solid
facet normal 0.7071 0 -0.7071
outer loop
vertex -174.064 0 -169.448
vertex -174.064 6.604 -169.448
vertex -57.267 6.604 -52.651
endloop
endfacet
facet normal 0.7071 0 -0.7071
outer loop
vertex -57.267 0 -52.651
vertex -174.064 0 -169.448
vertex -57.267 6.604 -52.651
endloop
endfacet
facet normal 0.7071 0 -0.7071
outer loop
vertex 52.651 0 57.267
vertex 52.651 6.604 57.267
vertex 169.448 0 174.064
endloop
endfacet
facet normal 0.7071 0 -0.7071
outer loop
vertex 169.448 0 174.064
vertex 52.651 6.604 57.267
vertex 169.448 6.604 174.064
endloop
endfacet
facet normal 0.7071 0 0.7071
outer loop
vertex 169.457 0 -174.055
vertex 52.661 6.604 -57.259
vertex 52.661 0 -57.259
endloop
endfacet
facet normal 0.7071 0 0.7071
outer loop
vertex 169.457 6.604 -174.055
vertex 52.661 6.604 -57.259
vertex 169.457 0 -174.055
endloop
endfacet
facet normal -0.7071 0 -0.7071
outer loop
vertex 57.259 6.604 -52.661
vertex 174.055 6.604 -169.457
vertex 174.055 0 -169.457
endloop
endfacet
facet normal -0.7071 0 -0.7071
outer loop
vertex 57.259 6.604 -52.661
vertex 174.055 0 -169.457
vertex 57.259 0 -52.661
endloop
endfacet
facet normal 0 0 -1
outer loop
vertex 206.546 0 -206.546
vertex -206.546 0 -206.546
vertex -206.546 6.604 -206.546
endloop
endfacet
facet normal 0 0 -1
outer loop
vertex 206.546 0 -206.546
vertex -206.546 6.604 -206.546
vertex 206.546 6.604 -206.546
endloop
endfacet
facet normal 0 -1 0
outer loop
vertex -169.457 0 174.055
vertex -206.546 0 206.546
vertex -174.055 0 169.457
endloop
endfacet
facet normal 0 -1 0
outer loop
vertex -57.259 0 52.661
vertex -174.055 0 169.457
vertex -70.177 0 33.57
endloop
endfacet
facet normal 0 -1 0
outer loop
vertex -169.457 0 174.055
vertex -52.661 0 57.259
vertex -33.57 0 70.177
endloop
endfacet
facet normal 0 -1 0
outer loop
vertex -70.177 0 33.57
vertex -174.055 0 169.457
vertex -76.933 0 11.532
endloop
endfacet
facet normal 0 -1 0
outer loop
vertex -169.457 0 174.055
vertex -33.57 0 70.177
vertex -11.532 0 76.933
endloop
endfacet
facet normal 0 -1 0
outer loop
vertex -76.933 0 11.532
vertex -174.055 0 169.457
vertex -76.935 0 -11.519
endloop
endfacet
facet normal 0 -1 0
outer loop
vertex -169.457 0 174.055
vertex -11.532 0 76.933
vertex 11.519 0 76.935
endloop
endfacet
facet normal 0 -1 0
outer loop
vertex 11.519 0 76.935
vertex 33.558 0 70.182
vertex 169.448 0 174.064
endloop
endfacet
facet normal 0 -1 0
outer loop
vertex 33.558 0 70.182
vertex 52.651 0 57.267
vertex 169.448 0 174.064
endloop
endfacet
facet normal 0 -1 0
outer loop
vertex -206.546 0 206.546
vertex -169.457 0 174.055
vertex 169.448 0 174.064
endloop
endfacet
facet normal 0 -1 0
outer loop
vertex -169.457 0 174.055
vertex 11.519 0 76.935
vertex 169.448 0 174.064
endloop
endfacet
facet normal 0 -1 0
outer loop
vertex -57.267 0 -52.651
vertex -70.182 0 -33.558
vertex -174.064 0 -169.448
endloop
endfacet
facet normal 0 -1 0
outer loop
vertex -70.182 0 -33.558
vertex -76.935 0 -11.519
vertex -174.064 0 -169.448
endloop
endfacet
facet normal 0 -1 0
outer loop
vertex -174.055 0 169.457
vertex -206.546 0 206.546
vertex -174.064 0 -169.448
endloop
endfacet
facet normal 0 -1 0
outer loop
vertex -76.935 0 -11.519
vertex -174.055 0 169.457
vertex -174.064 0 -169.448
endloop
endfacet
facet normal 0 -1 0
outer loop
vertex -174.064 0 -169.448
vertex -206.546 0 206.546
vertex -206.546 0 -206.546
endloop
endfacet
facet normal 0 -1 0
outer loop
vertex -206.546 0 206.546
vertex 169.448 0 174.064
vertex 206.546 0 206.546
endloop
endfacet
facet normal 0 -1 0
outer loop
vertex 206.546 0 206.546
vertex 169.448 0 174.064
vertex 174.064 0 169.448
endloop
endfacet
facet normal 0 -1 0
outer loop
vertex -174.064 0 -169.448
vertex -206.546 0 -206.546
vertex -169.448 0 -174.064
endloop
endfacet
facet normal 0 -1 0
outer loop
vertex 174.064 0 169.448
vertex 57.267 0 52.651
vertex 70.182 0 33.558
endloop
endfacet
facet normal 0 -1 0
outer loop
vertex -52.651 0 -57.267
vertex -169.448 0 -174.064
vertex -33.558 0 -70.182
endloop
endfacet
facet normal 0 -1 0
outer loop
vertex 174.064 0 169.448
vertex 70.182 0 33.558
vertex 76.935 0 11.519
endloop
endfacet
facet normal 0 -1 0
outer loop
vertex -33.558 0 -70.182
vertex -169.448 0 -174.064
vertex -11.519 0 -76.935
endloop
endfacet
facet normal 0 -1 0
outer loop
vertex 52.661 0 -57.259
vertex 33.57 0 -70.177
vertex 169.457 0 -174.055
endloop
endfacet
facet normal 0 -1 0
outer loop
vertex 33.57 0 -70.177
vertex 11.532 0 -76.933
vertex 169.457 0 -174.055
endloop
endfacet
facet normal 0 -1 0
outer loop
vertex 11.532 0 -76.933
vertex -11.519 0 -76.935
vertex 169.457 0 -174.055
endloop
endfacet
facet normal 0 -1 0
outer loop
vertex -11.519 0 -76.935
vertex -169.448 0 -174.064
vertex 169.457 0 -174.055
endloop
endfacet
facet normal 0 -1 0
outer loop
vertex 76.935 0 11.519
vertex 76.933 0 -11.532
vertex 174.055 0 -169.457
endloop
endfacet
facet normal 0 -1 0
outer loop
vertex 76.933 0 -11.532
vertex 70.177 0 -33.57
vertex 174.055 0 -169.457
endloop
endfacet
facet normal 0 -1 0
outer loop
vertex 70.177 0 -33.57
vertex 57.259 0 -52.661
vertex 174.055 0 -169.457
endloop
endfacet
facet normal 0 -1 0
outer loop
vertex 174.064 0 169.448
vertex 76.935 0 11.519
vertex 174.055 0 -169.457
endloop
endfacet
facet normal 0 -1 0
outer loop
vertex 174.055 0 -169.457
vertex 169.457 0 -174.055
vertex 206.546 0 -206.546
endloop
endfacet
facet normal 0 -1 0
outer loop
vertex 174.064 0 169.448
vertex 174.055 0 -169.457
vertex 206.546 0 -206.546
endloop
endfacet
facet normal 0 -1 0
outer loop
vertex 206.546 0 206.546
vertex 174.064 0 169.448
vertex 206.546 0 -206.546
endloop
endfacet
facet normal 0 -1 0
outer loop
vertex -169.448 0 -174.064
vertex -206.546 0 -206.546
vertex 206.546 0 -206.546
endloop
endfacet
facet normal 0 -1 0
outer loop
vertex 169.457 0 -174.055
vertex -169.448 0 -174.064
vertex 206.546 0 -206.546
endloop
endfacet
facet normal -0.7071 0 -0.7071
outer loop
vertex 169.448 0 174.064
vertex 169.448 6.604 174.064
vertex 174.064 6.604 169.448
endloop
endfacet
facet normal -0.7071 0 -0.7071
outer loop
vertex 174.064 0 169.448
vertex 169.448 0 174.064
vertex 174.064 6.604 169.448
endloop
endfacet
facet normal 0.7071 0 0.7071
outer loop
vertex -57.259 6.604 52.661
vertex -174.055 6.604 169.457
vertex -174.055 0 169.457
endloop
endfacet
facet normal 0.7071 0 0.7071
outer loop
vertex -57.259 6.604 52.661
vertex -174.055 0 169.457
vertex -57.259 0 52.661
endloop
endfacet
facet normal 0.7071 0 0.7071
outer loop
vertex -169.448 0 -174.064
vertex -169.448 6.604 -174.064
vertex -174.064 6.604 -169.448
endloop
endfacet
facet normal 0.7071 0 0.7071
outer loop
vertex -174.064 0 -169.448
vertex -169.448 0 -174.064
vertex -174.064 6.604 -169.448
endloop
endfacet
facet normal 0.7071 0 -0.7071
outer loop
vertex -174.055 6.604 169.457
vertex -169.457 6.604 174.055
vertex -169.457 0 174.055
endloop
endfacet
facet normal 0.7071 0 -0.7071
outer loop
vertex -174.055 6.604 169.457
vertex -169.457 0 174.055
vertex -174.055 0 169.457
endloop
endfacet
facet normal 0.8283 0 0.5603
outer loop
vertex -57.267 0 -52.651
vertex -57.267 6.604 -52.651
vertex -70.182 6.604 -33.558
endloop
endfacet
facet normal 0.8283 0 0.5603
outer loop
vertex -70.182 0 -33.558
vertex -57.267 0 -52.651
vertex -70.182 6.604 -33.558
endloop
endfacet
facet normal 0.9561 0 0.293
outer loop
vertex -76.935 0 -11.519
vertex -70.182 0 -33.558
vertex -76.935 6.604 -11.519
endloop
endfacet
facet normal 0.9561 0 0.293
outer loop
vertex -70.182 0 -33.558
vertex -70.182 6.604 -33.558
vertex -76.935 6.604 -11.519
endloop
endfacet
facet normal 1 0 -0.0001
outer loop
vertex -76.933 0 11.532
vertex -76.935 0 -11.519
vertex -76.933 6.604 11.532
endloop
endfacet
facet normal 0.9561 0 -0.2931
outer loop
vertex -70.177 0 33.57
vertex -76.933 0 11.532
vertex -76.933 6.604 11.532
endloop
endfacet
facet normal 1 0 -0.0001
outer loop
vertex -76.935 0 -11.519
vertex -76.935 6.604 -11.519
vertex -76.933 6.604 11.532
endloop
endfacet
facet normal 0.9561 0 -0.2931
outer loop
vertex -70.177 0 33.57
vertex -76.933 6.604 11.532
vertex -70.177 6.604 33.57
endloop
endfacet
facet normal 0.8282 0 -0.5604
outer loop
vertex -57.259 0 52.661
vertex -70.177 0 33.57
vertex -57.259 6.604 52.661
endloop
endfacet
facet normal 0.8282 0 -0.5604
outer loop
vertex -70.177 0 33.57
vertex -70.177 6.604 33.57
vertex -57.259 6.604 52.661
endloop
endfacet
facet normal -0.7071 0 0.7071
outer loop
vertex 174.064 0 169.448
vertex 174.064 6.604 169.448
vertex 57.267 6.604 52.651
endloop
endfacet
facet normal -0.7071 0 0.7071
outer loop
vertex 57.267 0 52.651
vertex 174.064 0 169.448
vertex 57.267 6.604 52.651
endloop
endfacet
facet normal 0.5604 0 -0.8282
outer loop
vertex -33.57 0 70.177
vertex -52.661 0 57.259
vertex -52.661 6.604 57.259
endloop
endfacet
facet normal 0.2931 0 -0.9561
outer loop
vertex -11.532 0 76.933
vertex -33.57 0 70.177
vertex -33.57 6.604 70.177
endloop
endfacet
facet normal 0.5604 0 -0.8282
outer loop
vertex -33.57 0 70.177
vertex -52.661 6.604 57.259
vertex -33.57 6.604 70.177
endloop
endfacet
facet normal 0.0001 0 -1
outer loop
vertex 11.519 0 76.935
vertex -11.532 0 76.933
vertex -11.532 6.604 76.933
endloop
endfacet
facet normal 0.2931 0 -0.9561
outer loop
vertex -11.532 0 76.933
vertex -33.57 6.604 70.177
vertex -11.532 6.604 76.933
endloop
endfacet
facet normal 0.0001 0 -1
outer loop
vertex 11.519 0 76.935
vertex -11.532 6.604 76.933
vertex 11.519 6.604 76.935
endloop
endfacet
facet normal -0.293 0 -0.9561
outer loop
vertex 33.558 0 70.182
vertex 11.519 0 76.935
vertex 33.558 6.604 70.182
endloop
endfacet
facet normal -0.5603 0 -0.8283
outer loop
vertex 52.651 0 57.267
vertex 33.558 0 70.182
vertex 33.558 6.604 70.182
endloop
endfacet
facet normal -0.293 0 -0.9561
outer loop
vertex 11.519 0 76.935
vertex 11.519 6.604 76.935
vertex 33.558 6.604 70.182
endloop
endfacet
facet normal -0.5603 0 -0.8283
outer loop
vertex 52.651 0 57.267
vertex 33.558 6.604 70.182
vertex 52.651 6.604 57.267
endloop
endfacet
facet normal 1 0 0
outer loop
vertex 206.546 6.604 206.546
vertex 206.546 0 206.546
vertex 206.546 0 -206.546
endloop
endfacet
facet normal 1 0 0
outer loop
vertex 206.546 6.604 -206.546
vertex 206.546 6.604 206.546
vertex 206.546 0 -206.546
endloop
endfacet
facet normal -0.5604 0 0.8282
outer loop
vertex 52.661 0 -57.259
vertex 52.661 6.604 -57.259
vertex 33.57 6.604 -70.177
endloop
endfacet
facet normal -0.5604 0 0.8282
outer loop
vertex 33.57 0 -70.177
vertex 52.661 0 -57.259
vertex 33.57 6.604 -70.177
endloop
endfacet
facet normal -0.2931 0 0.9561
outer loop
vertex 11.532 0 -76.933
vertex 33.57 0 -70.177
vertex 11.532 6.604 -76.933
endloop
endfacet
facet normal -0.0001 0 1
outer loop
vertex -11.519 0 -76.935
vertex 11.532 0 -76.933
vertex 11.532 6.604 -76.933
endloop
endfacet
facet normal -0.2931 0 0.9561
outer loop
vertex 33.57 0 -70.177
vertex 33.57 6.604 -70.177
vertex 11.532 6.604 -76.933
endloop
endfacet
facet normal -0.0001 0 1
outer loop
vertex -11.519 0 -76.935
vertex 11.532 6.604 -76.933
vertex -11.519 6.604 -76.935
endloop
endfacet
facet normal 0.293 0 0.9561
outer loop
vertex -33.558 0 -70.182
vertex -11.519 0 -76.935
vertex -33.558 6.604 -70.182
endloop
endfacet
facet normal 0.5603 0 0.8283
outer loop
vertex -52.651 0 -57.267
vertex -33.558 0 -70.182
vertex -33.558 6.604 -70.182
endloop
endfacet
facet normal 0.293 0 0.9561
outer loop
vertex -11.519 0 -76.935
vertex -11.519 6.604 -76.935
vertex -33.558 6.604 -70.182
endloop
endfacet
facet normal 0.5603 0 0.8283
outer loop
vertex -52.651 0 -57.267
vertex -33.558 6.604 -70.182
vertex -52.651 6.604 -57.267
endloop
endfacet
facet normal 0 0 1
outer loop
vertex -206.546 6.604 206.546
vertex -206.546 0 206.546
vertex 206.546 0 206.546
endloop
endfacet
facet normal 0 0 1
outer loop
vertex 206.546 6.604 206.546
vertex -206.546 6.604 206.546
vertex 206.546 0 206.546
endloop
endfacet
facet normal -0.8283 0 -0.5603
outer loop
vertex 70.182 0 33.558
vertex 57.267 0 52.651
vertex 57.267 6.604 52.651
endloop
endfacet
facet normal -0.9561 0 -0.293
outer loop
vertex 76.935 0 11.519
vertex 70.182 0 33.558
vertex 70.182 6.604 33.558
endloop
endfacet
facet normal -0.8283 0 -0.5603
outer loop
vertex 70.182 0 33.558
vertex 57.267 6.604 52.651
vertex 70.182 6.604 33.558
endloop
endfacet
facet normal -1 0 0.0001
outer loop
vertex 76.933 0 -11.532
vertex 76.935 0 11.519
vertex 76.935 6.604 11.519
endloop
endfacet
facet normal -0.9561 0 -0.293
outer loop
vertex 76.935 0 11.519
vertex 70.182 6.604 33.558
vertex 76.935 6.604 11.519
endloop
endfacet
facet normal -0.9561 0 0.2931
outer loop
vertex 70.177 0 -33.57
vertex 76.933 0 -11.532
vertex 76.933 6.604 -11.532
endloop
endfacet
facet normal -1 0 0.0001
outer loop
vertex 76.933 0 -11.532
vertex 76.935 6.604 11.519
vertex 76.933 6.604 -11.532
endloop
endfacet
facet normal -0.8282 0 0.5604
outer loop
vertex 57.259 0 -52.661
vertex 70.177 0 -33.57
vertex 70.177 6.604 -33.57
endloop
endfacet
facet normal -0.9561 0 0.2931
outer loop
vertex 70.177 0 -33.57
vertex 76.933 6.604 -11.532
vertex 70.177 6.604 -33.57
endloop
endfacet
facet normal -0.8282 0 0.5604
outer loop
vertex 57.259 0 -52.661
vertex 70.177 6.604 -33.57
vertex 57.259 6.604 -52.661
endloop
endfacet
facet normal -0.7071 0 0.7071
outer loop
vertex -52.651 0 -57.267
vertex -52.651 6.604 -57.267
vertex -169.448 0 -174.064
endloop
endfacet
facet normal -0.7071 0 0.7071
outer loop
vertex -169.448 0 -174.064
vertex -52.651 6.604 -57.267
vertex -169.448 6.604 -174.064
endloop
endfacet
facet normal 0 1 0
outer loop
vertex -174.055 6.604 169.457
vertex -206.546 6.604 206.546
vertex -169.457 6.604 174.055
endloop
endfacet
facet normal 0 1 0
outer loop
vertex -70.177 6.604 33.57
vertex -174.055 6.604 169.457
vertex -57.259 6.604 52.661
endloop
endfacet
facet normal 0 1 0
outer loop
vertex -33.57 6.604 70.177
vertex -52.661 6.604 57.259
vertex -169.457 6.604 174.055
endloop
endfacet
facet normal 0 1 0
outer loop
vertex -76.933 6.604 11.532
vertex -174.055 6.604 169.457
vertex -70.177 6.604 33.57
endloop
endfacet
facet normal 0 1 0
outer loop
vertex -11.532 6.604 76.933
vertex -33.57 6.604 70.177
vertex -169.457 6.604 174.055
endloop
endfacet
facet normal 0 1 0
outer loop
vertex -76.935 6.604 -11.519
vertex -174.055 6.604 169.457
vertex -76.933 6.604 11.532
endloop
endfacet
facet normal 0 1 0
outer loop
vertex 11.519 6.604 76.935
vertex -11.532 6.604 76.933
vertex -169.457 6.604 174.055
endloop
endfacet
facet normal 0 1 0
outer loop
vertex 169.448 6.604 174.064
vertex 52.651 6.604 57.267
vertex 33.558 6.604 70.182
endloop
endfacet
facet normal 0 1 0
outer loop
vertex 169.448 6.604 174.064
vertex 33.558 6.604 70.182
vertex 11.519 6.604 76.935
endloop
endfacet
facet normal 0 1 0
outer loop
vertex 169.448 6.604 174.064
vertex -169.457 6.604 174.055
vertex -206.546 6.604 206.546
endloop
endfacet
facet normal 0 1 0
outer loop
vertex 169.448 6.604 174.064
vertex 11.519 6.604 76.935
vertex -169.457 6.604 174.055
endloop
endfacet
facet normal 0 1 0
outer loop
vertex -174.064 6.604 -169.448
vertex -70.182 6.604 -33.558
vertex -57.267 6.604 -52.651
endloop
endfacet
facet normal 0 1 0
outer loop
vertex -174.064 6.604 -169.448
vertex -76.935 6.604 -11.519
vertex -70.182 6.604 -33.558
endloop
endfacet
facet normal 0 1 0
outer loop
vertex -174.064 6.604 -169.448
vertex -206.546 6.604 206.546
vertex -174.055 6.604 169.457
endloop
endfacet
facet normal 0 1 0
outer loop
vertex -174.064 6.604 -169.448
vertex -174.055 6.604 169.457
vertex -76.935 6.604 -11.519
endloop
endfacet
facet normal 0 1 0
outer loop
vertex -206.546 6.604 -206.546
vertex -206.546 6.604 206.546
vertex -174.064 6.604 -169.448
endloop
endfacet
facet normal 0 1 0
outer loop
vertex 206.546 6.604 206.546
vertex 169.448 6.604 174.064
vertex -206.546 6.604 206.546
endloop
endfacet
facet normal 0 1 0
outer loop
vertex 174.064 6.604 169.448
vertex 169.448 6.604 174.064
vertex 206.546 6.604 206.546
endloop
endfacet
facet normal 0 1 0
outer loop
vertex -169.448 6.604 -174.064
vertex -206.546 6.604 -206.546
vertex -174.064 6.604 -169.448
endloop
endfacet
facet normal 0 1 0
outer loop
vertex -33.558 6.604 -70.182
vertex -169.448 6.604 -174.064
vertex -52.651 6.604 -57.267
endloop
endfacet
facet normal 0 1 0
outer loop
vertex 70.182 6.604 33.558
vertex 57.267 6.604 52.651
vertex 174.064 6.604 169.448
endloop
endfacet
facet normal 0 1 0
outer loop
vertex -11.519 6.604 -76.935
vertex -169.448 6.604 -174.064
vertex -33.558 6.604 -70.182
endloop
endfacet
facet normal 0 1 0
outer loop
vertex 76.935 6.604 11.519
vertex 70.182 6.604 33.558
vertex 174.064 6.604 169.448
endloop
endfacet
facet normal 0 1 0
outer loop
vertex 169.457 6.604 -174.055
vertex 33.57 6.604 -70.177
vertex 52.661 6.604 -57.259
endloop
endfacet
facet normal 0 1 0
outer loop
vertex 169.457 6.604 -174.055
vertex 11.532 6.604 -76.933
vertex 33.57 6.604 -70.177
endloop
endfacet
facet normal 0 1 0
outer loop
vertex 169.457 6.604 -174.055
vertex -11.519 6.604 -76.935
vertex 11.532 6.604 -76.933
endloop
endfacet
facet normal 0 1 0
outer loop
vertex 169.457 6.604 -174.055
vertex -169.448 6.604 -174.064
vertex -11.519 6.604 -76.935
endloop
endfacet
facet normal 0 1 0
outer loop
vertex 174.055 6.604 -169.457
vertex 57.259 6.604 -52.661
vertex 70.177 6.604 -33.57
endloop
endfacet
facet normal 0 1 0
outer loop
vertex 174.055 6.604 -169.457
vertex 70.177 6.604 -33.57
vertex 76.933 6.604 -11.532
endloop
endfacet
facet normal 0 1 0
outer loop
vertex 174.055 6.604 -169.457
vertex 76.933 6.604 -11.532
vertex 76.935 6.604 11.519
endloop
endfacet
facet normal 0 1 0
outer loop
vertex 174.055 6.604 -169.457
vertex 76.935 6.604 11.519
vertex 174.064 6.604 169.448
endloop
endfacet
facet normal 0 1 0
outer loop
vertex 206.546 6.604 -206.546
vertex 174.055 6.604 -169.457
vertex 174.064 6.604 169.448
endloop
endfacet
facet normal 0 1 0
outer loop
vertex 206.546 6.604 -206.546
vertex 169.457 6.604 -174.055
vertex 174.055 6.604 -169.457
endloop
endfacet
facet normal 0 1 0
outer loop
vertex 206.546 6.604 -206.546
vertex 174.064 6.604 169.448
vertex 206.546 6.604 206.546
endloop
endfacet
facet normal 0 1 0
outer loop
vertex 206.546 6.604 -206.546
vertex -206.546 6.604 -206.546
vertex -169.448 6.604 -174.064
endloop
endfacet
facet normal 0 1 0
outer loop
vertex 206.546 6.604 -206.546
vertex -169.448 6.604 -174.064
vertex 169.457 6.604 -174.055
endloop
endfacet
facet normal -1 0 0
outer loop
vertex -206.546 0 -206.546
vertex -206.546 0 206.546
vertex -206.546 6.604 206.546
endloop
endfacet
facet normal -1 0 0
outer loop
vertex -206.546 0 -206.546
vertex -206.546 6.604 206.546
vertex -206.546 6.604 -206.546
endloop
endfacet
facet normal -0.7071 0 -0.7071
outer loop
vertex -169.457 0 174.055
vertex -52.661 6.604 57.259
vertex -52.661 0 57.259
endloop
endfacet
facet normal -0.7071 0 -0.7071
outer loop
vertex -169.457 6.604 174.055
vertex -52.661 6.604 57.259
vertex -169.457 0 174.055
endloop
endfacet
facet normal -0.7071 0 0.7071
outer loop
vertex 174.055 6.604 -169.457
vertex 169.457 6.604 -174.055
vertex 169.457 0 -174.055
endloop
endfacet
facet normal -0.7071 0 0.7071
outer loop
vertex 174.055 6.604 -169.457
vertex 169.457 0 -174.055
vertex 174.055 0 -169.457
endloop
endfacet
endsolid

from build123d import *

# Parameters (mm, degrees)
SKETCH4_W           = 413.09178157
SKETCH4_H           = 413.09178157
BOSS_EXTRUDE3_DEPTH = 6.604
SKETCH6_R           = 77.79258
CUT_EXTRUDE1_DEPTH  = 6.604
CUT_EXTRUDE2_DEPTH  = 6.604
CUT_EXTRUDE3_DEPTH  = 6.604


with BuildPart() as part:
    # Sketch4 → Boss-Extrude3 (new body)
    with BuildSketch(Plane(origin=(0, 0, 0), x_dir=(1, 0, 0), z_dir=(0, 1, 0))):
        Rectangle(SKETCH4_W, SKETCH4_H)
    extrude(amount=BOSS_EXTRUDE3_DEPTH)

    # Sketch6 → Cut-Extrude1 (cut)
    with BuildSketch(Plane(origin=(0, 6.604, 0), x_dir=(1, 0, 0), z_dir=(0, 1, 0))):
        Circle(SKETCH6_R)
    extrude(amount=-CUT_EXTRUDE1_DEPTH, mode=Mode.SUBTRACT)

    # Sketch8 → Cut-Extrude2 (cut)
    with BuildSketch(Plane(origin=(0, 6.604, 0), x_dir=(1, 0, 0), z_dir=(0, 1, 0))):
        Polygon((-174.055324139, -169.457433005), (169.457433005, 174.055324139), (174.055324139, 169.457433005), (-169.457433005, -174.055324139), align=None)
    extrude(amount=-CUT_EXTRUDE2_DEPTH, mode=Mode.SUBTRACT)

    # Sketch9 → Cut-Extrude3 (cut)
    with BuildSketch(Plane(origin=(0, 6.604, 0), x_dir=(1, 0, 0), z_dir=(0, 1, 0))):
        Polygon((174.064304395, -169.448452748), (-169.448452748, 174.064304395), (-174.064304395, 169.448452748), (169.448452748, -174.064304395), align=None)
    extrude(amount=-CUT_EXTRUDE3_DEPTH, mode=Mode.SUBTRACT)


solid = part.part
